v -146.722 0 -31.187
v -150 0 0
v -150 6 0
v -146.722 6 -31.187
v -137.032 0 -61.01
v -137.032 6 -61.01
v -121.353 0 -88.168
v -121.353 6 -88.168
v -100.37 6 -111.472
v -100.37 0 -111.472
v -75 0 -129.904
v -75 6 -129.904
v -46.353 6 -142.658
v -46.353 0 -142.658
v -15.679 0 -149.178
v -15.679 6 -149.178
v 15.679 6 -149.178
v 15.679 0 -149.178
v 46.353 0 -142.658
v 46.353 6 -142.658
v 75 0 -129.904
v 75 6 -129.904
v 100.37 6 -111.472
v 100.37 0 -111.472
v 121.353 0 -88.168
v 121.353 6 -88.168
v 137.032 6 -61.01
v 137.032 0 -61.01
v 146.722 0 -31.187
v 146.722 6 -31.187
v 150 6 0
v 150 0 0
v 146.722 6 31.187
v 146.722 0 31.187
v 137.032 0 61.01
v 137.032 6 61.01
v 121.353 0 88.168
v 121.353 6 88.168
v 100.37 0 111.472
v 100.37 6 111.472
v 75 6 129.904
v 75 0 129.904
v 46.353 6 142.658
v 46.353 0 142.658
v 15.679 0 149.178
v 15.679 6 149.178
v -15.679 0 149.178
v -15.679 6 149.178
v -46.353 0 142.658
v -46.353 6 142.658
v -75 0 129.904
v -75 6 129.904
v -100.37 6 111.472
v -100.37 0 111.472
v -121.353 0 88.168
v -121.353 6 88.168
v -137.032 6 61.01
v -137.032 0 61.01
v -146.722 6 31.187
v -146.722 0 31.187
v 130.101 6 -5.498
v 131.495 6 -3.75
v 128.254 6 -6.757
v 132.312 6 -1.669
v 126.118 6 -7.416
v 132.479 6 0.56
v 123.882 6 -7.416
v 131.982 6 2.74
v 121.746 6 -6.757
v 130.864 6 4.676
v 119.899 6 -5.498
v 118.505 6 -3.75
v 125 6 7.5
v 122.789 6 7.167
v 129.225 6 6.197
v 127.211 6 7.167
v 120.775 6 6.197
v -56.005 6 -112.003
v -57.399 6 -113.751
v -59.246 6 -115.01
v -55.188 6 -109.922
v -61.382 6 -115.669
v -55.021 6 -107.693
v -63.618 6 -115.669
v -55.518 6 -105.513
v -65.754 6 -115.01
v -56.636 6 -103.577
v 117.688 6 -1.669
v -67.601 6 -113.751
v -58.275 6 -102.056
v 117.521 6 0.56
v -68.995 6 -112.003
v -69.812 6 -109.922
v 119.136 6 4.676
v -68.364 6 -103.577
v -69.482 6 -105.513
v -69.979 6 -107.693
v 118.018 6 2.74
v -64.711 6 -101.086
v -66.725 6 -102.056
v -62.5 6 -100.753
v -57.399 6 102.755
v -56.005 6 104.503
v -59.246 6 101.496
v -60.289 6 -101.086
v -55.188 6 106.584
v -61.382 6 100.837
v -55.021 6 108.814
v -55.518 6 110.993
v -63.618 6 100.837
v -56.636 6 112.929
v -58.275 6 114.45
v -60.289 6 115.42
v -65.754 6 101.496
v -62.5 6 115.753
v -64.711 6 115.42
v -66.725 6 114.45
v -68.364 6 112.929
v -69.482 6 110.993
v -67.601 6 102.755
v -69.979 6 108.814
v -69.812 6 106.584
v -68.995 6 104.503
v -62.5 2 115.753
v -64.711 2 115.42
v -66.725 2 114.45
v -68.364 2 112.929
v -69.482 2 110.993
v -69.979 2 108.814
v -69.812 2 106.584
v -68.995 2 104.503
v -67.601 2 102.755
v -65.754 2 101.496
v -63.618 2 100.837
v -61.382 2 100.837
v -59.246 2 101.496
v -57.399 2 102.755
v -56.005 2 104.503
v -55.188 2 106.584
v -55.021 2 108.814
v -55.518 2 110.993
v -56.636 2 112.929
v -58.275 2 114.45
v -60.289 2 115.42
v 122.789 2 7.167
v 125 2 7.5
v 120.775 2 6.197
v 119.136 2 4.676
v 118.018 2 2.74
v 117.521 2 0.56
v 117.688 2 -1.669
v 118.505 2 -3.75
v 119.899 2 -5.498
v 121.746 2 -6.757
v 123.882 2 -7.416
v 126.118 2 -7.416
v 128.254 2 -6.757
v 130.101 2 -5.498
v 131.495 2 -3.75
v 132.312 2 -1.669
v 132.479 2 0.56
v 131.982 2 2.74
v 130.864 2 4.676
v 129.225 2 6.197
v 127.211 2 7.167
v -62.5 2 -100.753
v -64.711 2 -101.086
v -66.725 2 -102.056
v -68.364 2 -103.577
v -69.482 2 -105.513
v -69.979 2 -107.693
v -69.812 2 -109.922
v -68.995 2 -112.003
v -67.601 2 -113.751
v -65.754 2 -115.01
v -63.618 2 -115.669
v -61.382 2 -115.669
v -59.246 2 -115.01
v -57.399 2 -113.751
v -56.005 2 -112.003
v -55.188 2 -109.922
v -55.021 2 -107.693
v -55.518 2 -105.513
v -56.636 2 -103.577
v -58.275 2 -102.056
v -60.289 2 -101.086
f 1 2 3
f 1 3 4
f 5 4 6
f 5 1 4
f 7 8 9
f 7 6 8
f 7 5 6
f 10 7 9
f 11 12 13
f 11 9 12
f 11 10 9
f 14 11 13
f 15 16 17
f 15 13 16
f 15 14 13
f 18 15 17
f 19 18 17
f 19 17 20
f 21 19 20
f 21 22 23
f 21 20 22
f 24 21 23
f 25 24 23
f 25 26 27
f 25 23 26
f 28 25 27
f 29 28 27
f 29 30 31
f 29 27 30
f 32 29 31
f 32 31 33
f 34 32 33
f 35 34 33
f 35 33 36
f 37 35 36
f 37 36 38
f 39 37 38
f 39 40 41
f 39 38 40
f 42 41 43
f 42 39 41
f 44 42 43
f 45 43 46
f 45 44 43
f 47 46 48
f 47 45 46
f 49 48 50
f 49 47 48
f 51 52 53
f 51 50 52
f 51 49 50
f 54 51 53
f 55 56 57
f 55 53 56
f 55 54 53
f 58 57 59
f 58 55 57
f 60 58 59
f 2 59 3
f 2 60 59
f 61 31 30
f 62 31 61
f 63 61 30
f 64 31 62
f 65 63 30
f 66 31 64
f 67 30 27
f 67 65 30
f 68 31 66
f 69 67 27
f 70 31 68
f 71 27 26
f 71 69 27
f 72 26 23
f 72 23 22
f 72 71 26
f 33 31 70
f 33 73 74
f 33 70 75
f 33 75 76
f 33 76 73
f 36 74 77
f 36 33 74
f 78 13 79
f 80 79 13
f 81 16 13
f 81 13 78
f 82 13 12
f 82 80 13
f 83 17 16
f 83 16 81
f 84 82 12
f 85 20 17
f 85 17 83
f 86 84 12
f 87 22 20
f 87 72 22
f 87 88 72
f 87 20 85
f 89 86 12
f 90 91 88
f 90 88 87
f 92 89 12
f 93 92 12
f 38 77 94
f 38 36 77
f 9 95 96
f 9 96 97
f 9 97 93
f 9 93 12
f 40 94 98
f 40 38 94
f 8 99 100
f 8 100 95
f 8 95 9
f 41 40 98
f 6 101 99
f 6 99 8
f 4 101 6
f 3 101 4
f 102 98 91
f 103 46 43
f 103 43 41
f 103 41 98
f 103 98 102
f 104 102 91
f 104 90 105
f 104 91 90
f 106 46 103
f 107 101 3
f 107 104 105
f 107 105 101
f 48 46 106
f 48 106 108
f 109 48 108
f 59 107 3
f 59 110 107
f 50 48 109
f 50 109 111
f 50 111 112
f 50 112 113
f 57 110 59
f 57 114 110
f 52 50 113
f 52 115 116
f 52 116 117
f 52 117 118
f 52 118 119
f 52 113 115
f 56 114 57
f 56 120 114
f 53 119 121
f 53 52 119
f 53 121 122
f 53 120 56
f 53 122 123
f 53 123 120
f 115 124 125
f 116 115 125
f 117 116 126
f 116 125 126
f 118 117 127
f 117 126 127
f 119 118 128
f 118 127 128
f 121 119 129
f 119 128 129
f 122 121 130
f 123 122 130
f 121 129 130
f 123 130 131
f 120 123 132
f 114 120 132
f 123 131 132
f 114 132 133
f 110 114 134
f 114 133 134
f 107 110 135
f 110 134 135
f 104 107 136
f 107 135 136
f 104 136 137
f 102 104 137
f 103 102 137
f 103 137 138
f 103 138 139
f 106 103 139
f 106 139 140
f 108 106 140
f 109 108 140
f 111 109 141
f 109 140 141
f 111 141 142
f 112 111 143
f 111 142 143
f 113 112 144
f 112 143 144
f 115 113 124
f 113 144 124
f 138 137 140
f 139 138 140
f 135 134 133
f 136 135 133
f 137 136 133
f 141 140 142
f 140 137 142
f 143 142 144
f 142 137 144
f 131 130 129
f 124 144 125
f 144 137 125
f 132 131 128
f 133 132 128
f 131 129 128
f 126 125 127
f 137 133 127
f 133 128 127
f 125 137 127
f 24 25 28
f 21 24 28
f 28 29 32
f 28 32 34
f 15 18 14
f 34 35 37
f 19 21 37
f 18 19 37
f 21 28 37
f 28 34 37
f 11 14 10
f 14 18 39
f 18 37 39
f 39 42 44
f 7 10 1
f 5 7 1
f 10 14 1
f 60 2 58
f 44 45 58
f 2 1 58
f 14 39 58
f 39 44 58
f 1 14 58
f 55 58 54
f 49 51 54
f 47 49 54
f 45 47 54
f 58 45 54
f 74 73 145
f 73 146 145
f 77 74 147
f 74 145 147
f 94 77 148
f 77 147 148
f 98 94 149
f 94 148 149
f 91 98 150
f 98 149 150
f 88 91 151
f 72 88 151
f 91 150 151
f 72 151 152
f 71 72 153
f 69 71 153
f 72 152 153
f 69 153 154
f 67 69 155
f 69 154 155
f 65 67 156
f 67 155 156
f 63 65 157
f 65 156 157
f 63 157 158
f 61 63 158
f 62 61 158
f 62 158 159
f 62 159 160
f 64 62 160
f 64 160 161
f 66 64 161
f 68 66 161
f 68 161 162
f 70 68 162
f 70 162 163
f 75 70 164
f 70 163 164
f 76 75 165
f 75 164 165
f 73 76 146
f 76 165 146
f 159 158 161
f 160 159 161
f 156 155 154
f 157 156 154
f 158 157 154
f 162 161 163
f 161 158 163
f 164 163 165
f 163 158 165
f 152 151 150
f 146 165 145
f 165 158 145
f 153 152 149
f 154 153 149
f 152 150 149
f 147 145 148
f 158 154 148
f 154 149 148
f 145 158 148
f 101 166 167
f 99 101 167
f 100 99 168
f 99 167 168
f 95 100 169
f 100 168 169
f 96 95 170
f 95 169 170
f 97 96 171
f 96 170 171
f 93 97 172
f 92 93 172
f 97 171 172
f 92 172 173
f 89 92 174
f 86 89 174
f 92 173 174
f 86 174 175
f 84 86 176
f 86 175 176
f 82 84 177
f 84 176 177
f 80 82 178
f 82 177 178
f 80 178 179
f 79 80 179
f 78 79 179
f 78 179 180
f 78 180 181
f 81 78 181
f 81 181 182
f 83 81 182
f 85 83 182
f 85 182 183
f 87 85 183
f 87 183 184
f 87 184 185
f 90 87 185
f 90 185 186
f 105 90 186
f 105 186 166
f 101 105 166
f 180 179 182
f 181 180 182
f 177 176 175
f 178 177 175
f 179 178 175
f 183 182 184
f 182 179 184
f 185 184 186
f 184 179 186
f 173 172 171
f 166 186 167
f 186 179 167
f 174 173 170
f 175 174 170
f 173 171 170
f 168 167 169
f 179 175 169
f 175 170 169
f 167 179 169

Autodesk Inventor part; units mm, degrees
ref_plane "YZ Plane" through (0, 0, 0) normal (1, 0, 0) x (0, 1, 0)
ref_plane "XZ Plane" through (0, 0, 0) normal (0, 1, 0) x (-1, 0, 0)
ref_plane "XY Plane" through (0, 0, 0) normal (0, 0, 1) x (1, 0, 0)
sketch "Sketch6" plane through (0, 0, 0) normal (0, 1, 0) x (-1, 0, 0)
  circle A0 centre (0, 0) radius 150
  dimension "d17" = 300
extrude "Extrusion3" add sketch "Sketch6" along normal blind 6
sketch "Sketch7" plane through (0, 6, 0) normal (0, 1, 0) x (1, 0, 0)
  circle A0 centre (0, 0) radius 125
  line L0 (125, 0) -> (-62.5, 108.2532) construction
  line L1 (-62.5, 108.2532) -> (-62.5, -108.2532) construction
  line L2 (-62.5, -108.2532) -> (125, 0) construction
  line L3 (0, 0) -> (125, 0) construction
  line L4 (-62.5, -108.2532) -> (0, 0) construction
  line L5 (0, 0) -> (-62.5, 108.2532) construction
  dimension "d20" = 250
hole "Hole2" at (125, 6, 0) direction (0, -1, 0) diameter 15 depth 4
hole "Hole3" at (-62.5, 6, 108.2532) direction (0, -1, 0) diameter 15 depth 4
hole "Hole4" at (-62.5, 6, -108.2532) direction (0, -1, 0) diameter 15 depth 4
properties part number "Fußßß"
